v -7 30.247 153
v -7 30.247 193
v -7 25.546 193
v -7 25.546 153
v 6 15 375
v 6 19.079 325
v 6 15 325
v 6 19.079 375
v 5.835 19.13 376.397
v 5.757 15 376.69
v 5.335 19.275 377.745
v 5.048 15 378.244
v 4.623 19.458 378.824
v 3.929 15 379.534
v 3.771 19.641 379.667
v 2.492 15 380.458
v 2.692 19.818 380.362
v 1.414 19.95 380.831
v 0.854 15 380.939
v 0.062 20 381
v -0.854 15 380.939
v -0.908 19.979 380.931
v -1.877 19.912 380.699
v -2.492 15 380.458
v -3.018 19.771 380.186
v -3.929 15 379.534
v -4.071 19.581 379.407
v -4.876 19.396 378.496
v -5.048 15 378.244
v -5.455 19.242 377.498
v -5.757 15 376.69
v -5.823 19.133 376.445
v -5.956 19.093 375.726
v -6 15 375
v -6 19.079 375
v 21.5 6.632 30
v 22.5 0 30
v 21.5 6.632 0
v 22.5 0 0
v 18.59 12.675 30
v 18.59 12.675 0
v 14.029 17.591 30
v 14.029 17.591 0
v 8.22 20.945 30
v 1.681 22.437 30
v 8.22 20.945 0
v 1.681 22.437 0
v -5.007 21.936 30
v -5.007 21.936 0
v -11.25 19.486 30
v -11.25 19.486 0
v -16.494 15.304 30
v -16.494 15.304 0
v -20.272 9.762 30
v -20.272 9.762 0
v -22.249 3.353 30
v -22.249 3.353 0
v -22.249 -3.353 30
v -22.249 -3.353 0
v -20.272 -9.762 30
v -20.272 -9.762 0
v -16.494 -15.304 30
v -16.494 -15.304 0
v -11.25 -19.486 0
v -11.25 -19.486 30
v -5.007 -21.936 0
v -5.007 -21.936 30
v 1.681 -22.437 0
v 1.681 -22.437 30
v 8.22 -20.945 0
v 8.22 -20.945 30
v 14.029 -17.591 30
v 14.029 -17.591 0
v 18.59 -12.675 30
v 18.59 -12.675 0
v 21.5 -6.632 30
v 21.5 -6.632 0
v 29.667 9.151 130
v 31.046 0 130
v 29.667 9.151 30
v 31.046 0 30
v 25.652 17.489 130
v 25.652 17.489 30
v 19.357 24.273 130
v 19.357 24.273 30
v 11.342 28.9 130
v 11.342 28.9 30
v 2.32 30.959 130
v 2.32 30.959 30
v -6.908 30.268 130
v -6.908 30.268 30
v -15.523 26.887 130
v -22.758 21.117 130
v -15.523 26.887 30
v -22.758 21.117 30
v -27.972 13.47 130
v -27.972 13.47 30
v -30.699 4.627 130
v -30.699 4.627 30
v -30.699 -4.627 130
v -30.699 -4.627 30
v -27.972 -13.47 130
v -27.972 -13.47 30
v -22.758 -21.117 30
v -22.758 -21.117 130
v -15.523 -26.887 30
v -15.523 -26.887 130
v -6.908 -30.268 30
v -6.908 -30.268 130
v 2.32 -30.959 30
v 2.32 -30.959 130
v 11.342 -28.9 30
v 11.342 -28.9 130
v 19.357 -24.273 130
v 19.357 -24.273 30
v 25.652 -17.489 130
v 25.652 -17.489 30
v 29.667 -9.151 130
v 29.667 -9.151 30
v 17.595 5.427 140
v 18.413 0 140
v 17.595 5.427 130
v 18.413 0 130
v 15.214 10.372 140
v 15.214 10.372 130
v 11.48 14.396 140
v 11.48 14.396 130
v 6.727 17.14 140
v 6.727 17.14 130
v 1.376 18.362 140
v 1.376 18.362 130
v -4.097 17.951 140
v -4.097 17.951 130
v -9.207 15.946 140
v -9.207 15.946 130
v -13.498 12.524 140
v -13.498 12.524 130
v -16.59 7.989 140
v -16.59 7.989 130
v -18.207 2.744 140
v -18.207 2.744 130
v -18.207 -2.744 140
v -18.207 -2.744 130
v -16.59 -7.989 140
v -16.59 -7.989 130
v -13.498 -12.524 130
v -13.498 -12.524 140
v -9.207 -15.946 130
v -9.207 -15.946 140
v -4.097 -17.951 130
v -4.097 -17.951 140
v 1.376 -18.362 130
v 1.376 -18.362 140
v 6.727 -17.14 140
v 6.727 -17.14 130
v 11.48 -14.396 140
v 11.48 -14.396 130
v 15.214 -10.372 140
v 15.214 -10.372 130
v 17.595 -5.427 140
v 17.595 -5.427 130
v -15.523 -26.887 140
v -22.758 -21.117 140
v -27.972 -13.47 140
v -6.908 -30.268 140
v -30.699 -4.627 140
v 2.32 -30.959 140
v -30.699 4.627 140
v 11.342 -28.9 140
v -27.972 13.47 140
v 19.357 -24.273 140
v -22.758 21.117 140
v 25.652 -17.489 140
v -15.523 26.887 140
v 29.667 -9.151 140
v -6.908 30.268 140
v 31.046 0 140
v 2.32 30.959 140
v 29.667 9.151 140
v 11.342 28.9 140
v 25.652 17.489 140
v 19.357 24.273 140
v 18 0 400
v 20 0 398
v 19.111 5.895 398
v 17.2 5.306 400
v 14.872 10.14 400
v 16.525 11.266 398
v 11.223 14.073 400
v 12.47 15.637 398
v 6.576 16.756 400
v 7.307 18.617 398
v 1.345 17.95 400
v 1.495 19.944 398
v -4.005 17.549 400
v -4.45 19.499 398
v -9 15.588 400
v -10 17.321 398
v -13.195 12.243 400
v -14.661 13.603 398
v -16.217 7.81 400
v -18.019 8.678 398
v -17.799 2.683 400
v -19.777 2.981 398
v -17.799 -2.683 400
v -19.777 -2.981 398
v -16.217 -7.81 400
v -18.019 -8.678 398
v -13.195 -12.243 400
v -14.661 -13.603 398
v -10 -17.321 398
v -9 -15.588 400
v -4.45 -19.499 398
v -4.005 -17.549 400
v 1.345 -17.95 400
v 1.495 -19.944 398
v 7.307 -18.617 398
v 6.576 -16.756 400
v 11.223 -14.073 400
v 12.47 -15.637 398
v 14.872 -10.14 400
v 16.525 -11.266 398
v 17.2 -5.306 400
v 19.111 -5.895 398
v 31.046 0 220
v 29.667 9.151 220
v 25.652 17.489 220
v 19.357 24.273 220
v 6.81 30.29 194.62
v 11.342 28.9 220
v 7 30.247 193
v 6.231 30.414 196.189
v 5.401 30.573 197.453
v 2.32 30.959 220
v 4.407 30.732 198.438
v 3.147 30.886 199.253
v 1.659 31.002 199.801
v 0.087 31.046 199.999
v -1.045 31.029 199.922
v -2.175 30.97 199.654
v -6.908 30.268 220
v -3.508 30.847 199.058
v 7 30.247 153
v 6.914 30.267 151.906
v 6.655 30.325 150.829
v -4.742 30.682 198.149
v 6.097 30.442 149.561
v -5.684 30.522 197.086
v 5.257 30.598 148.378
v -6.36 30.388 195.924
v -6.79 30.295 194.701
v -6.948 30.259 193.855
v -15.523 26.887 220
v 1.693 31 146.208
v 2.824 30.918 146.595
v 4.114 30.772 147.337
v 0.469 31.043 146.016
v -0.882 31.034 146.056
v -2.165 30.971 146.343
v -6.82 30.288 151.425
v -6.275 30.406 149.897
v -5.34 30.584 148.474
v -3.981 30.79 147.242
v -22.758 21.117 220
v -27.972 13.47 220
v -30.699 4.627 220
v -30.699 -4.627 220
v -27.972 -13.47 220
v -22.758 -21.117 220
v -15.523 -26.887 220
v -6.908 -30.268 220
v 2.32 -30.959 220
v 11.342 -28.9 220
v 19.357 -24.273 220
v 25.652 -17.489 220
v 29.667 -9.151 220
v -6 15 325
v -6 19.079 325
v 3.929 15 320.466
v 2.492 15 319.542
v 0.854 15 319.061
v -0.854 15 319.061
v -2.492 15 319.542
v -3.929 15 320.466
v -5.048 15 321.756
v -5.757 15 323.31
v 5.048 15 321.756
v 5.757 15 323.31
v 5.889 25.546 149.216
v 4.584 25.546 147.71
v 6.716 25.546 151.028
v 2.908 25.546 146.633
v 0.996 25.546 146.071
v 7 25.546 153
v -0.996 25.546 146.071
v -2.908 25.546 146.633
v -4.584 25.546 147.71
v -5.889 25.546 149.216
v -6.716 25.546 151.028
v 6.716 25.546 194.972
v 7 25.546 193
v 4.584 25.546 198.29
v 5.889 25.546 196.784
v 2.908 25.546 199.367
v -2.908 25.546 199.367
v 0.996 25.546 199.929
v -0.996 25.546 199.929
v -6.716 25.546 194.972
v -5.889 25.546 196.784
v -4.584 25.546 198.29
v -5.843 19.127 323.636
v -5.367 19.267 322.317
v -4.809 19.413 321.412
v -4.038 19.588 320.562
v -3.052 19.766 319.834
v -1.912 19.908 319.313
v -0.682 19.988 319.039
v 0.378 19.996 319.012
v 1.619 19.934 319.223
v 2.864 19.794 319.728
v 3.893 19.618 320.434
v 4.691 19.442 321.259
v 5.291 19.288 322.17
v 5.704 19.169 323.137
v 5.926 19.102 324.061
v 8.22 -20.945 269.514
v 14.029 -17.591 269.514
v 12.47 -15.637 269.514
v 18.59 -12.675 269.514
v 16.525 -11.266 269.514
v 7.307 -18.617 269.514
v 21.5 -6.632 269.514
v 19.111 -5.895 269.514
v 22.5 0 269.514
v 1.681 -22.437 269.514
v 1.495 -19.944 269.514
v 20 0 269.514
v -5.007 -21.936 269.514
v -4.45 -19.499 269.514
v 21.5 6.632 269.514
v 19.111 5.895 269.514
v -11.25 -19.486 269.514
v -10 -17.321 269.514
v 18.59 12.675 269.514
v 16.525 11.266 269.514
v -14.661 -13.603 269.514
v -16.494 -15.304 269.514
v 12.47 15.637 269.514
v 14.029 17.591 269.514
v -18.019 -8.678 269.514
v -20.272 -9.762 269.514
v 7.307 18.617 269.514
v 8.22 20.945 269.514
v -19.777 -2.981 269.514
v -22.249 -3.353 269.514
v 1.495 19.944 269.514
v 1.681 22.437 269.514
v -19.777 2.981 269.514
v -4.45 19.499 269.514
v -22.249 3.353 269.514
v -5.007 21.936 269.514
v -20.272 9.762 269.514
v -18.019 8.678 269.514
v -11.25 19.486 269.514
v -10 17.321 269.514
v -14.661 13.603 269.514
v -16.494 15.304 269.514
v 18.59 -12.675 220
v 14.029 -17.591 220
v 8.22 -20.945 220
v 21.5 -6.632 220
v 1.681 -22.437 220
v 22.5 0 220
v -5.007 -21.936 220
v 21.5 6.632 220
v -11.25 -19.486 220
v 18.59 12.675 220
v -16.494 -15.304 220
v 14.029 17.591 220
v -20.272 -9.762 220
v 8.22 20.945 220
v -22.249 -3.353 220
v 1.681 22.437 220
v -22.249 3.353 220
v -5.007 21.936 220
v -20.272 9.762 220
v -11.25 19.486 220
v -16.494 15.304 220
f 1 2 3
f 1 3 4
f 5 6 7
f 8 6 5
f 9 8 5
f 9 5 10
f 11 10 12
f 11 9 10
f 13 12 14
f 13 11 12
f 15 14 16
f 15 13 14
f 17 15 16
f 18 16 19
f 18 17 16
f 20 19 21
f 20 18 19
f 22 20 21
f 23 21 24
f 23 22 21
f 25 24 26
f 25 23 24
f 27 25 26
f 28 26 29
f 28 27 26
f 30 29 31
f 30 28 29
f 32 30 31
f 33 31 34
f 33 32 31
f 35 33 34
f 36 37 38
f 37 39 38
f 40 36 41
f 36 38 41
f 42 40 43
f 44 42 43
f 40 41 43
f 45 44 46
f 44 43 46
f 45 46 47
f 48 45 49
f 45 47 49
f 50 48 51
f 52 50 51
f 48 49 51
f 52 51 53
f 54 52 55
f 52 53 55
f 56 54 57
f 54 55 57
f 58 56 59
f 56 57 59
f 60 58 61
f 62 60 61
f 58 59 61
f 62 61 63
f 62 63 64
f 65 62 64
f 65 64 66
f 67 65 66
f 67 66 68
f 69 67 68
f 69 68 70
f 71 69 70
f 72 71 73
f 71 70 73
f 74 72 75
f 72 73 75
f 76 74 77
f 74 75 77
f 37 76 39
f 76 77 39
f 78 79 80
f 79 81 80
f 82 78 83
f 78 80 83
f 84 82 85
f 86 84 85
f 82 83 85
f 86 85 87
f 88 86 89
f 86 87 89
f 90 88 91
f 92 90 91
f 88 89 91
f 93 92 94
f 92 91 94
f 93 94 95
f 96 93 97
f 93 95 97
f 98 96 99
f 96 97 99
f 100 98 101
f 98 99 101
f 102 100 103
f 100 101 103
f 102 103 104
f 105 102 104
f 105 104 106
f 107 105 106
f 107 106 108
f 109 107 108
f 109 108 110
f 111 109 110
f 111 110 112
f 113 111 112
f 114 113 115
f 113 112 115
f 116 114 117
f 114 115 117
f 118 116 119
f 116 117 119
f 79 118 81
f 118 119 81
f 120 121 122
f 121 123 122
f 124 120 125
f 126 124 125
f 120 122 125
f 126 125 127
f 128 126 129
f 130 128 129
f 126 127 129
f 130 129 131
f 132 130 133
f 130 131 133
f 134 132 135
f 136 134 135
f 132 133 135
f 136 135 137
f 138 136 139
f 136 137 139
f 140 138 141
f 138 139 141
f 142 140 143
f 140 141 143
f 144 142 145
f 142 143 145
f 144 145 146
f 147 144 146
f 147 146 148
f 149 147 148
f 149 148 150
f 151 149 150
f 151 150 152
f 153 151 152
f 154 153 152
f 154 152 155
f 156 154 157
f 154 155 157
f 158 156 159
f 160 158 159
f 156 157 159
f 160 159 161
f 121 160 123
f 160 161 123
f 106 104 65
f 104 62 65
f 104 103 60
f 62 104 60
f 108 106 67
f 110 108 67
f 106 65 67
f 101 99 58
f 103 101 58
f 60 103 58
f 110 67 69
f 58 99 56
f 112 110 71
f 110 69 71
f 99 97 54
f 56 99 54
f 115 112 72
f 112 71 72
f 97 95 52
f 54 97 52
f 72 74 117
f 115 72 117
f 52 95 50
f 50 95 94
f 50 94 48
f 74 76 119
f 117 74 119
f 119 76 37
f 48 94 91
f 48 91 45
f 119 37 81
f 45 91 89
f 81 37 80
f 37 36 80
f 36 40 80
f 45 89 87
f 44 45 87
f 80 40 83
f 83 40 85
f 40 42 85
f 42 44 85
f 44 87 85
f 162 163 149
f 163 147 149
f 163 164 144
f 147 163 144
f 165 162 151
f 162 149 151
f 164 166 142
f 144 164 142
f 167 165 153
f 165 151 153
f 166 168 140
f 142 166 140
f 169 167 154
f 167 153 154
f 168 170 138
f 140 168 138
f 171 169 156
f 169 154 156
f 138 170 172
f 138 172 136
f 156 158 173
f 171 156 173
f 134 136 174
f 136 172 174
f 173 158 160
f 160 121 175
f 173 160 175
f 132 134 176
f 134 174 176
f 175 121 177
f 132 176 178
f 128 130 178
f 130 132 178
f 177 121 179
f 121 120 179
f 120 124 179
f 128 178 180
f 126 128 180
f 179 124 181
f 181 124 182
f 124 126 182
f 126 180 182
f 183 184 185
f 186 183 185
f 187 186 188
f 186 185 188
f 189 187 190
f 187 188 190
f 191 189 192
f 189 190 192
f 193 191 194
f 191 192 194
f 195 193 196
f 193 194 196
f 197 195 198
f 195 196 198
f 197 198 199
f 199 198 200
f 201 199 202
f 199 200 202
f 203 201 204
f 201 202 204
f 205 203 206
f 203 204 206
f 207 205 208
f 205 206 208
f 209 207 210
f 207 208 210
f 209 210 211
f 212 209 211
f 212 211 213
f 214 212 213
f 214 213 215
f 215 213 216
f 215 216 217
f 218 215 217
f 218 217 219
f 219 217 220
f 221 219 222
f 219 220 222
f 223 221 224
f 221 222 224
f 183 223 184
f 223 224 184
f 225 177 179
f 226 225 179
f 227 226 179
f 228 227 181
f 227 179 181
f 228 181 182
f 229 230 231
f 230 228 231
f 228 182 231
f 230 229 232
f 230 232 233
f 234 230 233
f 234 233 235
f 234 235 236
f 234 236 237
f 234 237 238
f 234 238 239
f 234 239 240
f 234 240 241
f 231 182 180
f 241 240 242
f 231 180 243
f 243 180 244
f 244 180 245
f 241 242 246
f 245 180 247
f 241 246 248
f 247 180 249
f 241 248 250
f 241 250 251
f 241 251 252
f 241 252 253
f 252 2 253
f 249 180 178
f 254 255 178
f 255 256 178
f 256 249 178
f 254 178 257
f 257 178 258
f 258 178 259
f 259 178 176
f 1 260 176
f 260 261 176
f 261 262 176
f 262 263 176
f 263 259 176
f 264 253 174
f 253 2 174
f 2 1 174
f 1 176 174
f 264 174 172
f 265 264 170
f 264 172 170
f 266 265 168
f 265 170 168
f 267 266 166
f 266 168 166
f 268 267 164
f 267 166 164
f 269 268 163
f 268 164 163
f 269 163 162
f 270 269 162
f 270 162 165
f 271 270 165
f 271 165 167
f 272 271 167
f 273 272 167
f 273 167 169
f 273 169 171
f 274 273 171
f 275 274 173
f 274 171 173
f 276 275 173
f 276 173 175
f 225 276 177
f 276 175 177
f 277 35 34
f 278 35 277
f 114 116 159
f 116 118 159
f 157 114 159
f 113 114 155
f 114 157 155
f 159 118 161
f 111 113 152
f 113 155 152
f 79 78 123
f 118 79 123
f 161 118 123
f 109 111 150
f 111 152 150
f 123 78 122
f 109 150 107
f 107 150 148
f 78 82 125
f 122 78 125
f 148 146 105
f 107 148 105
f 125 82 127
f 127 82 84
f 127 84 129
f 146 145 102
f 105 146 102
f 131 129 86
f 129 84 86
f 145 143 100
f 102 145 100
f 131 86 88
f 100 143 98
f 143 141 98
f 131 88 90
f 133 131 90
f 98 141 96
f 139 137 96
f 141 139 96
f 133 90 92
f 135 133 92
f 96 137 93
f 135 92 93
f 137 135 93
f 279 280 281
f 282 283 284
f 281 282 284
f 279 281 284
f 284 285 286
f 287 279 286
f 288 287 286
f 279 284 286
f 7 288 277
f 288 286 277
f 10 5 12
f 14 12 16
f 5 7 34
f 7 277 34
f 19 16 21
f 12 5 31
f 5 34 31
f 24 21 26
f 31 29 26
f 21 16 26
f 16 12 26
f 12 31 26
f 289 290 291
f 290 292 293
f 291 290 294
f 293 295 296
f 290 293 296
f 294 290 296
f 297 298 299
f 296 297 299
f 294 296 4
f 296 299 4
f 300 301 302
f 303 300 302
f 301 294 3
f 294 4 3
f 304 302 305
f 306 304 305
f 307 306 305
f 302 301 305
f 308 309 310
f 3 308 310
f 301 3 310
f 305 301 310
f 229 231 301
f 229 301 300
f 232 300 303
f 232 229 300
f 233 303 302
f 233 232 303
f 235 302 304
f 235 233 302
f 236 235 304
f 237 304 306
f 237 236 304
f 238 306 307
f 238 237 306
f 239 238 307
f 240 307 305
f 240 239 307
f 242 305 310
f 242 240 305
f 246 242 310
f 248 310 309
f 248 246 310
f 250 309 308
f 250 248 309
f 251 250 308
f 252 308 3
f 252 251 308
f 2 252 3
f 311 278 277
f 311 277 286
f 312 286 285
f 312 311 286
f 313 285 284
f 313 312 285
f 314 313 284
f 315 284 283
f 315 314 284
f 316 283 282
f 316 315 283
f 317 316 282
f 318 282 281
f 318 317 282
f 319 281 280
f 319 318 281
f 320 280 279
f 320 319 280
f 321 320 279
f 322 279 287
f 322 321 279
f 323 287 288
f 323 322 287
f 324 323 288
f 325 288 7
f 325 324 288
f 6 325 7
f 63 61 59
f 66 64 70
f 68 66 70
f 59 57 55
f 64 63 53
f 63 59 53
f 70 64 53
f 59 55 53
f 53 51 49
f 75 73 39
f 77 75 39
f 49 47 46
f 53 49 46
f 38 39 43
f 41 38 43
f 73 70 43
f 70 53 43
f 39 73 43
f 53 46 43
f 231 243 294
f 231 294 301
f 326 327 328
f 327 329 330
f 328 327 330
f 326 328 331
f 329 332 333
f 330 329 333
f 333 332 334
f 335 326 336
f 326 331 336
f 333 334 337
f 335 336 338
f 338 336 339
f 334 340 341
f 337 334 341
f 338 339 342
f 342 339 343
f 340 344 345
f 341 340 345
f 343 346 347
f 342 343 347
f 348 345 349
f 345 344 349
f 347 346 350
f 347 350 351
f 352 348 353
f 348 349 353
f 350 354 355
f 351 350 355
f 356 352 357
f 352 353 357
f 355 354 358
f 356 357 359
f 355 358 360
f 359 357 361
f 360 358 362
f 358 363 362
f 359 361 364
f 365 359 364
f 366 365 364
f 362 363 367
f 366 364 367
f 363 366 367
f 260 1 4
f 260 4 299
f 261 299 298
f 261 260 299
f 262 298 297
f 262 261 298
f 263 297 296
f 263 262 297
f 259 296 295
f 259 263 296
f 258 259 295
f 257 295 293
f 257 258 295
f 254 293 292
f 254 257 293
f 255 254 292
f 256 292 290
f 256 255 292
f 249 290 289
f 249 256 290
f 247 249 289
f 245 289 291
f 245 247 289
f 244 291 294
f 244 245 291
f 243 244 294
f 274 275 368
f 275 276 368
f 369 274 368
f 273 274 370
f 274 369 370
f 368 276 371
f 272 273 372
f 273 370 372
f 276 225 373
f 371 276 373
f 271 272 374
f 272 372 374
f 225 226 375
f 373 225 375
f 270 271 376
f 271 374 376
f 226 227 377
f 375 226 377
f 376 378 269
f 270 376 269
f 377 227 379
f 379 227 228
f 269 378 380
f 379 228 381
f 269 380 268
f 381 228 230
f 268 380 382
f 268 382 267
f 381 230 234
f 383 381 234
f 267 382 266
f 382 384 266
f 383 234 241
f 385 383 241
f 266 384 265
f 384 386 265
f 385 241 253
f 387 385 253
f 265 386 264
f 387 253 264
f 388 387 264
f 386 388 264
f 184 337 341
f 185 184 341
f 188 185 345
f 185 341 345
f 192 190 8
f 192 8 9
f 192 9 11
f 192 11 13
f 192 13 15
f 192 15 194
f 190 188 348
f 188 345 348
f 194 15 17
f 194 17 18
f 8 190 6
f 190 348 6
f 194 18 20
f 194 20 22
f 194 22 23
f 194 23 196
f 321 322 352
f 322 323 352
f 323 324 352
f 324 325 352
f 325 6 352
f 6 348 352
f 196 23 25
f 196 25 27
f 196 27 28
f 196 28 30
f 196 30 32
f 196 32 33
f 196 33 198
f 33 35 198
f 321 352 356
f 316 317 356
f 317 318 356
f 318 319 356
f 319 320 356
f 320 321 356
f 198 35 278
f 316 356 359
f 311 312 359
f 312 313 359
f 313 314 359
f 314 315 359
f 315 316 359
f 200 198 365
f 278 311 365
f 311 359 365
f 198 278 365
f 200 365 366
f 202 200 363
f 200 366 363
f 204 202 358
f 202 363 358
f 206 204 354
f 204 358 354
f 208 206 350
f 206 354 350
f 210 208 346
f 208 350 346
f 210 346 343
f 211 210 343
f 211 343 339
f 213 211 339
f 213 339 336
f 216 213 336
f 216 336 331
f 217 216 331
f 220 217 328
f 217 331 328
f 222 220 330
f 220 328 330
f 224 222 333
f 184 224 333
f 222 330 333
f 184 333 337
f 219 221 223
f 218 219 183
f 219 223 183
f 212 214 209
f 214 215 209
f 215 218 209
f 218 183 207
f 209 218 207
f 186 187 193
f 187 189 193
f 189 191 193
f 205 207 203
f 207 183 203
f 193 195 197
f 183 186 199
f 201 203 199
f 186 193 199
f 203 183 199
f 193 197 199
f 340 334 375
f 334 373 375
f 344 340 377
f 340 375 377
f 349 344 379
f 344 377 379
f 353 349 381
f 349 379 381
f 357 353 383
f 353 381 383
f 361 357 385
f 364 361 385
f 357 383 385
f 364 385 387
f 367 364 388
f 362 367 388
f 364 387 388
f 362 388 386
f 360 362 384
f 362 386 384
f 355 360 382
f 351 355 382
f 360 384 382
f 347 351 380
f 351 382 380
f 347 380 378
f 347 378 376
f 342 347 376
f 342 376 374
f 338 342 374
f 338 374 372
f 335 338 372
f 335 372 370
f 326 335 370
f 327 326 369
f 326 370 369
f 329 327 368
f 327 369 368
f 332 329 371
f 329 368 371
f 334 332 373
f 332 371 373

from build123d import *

# Parameters (mm, degrees)
CUT_EXTRUDE1_DEPTH  = 5
CUT_EXTRUDE12_DEPTH = 5.5
CHAMFER1_SIZE       = 2


with BuildPart() as part:
    # Sketch1 → Revolve1 (revolve)
    with BuildSketch(Plane(origin=(0, 0, 0), x_dir=(1, 0, 0), z_dir=(0, 1, 0))):
        Polygon((0, 0), (0, -400), (20, -400), (20, -269.514398681), (22.5, -269.514398681), (22.5, -220), (31.046216184, -220), (31.046216184, -140), (18.413082613, -140), (18.413082613, -130), (31.046216184, -130), (31.046216184, -30), (22.5, -30), (22.5, 0), align=None)
    revolve(axis=Axis((0, 0, 0), (0, 0, 1)))

    # Sketch3 → Cut-Extrude1 (cut)
    with BuildSketch(Plane(origin=(0, 20, 400), x_dir=(0, 0, 1), z_dir=(0, -1, 0))):
        with BuildLine():
            Line((-25, 6), (-75, 6))
            ThreePointArc((-75, 6), (-81, 0), (-75, -6))
            Line((-75, -6), (-25, -6))
            ThreePointArc((-25, -6), (-19, 0), (-25, 6))
        make_face()
    extrude(amount=CUT_EXTRUDE1_DEPTH, mode=Mode.SUBTRACT)

    # Sketch32 → Cut-Extrude12 (cut)
    with BuildSketch(Plane(origin=(0, 31.046216184, 220), x_dir=(0, 0, 1), z_dir=(0, -1, 0))):
        with BuildLine():
            Line((-27, 7), (-67, 7))
            ThreePointArc((-67, 7), (-74, 0), (-67, -7))
            Line((-67, -7), (-27, -7))
            ThreePointArc((-27, -7), (-20, 0), (-27, 7))
        make_face()
    extrude(amount=CUT_EXTRUDE12_DEPTH, mode=Mode.SUBTRACT)

    # Chamfer1
    chamfer1_edges = [part.edges().sort_by_distance(p)[0] for p in [
        (-20, 0, 400),
    ]]
    chamfer(chamfer1_edges, length=CHAMFER1_SIZE)


solid = part.part
